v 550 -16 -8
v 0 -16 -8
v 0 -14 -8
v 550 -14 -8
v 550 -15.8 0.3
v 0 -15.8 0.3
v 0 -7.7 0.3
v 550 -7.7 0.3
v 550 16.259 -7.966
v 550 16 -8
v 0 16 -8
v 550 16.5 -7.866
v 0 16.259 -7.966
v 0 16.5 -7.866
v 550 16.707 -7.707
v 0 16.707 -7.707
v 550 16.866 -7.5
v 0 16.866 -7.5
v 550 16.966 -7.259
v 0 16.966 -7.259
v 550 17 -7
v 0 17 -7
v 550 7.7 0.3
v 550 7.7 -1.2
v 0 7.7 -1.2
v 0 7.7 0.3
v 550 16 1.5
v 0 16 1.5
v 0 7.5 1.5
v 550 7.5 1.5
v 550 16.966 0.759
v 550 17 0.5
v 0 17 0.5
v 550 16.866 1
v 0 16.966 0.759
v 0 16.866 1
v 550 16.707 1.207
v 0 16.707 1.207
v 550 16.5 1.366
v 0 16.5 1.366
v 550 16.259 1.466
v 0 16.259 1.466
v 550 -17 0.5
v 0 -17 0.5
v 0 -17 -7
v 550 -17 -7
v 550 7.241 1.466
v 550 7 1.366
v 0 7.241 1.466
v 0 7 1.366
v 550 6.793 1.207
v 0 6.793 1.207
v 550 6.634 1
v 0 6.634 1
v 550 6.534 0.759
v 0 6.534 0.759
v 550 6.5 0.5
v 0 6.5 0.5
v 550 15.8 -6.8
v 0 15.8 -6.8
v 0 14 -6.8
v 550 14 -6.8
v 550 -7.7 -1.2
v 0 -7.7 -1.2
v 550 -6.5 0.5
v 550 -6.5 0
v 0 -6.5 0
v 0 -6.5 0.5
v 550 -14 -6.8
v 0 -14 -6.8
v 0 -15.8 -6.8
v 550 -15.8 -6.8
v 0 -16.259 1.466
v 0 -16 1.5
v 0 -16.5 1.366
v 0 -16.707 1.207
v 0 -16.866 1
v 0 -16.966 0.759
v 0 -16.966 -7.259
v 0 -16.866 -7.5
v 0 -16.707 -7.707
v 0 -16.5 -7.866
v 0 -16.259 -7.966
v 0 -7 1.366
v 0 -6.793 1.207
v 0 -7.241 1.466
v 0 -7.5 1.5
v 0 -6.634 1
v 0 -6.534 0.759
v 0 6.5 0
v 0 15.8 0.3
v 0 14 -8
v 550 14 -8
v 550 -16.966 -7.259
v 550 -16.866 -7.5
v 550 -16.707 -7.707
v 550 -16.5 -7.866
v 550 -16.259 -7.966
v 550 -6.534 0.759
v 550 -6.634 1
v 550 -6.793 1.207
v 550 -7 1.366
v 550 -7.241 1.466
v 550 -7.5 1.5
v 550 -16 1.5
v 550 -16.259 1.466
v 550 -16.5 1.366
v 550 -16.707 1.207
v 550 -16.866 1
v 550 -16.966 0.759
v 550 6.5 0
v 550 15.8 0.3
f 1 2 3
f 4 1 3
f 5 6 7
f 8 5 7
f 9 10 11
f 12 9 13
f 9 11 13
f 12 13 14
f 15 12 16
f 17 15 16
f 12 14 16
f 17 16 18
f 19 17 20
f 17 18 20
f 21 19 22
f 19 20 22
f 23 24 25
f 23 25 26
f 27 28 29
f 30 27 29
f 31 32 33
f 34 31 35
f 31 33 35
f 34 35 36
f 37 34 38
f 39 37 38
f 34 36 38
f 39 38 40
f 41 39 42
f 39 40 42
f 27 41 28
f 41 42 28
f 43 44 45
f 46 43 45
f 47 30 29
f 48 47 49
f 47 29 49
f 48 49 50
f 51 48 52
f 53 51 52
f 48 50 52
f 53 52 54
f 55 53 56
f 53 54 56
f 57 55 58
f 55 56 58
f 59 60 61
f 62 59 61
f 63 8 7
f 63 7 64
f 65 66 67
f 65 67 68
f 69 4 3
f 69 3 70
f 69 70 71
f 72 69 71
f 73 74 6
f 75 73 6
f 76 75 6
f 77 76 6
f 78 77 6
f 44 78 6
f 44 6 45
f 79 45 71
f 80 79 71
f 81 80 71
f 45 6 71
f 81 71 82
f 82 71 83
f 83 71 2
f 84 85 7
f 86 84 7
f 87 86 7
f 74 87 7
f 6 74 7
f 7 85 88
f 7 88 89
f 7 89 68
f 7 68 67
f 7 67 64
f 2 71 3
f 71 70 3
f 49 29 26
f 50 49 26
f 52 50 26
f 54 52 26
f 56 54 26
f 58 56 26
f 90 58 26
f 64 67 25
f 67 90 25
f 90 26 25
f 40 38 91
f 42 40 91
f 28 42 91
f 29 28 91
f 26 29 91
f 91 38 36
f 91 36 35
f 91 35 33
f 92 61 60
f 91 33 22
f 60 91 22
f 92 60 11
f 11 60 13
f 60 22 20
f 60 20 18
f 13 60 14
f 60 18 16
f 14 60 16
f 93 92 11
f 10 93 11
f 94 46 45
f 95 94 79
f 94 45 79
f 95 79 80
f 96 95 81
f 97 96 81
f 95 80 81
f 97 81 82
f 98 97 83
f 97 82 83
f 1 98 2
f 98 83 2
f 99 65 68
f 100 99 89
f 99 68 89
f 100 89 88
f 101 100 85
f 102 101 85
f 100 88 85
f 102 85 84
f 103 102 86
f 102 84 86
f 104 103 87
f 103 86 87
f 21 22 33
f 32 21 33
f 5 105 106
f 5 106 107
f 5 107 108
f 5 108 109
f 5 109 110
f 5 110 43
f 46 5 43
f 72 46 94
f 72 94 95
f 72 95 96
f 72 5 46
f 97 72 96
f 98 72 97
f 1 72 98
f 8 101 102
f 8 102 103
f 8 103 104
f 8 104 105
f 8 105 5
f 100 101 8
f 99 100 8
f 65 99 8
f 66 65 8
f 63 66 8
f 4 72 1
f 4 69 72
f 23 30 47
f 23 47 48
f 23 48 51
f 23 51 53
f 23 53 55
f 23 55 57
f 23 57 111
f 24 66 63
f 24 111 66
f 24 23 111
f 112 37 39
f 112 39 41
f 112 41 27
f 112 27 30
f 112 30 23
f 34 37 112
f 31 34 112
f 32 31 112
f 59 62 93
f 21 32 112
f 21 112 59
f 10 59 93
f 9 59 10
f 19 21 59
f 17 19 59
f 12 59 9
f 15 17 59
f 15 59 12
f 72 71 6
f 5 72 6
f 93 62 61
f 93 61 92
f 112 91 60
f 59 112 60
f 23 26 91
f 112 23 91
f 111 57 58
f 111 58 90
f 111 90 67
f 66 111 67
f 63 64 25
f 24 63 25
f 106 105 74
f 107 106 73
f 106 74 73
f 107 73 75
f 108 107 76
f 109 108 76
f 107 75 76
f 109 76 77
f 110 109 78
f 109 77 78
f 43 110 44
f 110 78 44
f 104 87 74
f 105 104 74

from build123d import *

# Parameters (mm, degrees)
EXTRUDE_3_DEPTH = 550


with BuildPart() as part:
    # Эскиз1 → Вытянуть-Тонкостенный3 (new body)
    with BuildSketch(Plane(origin=(0, 0, 0), x_dir=(0, 0, -1), z_dir=(1, 0, 0))):
        with BuildLine():
            Line((8, 14), (8, 16))
            ThreePointArc((8, 16), (7.707106781, 16.707106781), (7, 17))
            Line((7, 17), (-0.5, 17))
            ThreePointArc((-0.5, 17), (-1.207106781, 16.707106781), (-1.5, 16))
            Line((-1.5, 16), (-1.5, 7.5))
            ThreePointArc((-1.5, 7.5), (-1.207106781, 6.792893219), (-0.5, 6.5))
            Line((-0.5, 6.5), (0, 6.5))
            Line((0, 6.5), (0, -6.5))
            Line((0, -6.5), (-0.5, -6.5))
            ThreePointArc((-0.5, -6.5), (-1.207106781, -6.792893219), (-1.5, -7.5))
            Line((-1.5, -7.5), (-1.5, -16))
            ThreePointArc((-1.5, -16), (-1.207106781, -16.707106781), (-0.5, -17))
            Line((-0.5, -17), (7, -17))
            ThreePointArc((7, -17), (7.707106781, -16.707106781), (8, -16))
            Line((8, -16), (8, -14))
            Line((8, -14), (6.8, -14))
            Line((6.8, -14), (6.8, -15.8))
            Line((6.8, -15.8), (-0.3, -15.8))
            Line((-0.3, -15.8), (-0.3, -7.7))
            Line((-0.3, -7.7), (1.2, -7.7))
            Line((1.2, -7.7), (1.2, 7.7))
            Line((1.2, 7.7), (-0.3, 7.7))
            Line((-0.3, 7.7), (-0.3, 15.8))
            Line((-0.3, 15.8), (6.8, 15.8))
            Line((6.8, 15.8), (6.8, 14))
            Line((6.8, 14), (8, 14))
        make_face()
    extrude(amount=EXTRUDE_3_DEPTH)


solid = part.part
